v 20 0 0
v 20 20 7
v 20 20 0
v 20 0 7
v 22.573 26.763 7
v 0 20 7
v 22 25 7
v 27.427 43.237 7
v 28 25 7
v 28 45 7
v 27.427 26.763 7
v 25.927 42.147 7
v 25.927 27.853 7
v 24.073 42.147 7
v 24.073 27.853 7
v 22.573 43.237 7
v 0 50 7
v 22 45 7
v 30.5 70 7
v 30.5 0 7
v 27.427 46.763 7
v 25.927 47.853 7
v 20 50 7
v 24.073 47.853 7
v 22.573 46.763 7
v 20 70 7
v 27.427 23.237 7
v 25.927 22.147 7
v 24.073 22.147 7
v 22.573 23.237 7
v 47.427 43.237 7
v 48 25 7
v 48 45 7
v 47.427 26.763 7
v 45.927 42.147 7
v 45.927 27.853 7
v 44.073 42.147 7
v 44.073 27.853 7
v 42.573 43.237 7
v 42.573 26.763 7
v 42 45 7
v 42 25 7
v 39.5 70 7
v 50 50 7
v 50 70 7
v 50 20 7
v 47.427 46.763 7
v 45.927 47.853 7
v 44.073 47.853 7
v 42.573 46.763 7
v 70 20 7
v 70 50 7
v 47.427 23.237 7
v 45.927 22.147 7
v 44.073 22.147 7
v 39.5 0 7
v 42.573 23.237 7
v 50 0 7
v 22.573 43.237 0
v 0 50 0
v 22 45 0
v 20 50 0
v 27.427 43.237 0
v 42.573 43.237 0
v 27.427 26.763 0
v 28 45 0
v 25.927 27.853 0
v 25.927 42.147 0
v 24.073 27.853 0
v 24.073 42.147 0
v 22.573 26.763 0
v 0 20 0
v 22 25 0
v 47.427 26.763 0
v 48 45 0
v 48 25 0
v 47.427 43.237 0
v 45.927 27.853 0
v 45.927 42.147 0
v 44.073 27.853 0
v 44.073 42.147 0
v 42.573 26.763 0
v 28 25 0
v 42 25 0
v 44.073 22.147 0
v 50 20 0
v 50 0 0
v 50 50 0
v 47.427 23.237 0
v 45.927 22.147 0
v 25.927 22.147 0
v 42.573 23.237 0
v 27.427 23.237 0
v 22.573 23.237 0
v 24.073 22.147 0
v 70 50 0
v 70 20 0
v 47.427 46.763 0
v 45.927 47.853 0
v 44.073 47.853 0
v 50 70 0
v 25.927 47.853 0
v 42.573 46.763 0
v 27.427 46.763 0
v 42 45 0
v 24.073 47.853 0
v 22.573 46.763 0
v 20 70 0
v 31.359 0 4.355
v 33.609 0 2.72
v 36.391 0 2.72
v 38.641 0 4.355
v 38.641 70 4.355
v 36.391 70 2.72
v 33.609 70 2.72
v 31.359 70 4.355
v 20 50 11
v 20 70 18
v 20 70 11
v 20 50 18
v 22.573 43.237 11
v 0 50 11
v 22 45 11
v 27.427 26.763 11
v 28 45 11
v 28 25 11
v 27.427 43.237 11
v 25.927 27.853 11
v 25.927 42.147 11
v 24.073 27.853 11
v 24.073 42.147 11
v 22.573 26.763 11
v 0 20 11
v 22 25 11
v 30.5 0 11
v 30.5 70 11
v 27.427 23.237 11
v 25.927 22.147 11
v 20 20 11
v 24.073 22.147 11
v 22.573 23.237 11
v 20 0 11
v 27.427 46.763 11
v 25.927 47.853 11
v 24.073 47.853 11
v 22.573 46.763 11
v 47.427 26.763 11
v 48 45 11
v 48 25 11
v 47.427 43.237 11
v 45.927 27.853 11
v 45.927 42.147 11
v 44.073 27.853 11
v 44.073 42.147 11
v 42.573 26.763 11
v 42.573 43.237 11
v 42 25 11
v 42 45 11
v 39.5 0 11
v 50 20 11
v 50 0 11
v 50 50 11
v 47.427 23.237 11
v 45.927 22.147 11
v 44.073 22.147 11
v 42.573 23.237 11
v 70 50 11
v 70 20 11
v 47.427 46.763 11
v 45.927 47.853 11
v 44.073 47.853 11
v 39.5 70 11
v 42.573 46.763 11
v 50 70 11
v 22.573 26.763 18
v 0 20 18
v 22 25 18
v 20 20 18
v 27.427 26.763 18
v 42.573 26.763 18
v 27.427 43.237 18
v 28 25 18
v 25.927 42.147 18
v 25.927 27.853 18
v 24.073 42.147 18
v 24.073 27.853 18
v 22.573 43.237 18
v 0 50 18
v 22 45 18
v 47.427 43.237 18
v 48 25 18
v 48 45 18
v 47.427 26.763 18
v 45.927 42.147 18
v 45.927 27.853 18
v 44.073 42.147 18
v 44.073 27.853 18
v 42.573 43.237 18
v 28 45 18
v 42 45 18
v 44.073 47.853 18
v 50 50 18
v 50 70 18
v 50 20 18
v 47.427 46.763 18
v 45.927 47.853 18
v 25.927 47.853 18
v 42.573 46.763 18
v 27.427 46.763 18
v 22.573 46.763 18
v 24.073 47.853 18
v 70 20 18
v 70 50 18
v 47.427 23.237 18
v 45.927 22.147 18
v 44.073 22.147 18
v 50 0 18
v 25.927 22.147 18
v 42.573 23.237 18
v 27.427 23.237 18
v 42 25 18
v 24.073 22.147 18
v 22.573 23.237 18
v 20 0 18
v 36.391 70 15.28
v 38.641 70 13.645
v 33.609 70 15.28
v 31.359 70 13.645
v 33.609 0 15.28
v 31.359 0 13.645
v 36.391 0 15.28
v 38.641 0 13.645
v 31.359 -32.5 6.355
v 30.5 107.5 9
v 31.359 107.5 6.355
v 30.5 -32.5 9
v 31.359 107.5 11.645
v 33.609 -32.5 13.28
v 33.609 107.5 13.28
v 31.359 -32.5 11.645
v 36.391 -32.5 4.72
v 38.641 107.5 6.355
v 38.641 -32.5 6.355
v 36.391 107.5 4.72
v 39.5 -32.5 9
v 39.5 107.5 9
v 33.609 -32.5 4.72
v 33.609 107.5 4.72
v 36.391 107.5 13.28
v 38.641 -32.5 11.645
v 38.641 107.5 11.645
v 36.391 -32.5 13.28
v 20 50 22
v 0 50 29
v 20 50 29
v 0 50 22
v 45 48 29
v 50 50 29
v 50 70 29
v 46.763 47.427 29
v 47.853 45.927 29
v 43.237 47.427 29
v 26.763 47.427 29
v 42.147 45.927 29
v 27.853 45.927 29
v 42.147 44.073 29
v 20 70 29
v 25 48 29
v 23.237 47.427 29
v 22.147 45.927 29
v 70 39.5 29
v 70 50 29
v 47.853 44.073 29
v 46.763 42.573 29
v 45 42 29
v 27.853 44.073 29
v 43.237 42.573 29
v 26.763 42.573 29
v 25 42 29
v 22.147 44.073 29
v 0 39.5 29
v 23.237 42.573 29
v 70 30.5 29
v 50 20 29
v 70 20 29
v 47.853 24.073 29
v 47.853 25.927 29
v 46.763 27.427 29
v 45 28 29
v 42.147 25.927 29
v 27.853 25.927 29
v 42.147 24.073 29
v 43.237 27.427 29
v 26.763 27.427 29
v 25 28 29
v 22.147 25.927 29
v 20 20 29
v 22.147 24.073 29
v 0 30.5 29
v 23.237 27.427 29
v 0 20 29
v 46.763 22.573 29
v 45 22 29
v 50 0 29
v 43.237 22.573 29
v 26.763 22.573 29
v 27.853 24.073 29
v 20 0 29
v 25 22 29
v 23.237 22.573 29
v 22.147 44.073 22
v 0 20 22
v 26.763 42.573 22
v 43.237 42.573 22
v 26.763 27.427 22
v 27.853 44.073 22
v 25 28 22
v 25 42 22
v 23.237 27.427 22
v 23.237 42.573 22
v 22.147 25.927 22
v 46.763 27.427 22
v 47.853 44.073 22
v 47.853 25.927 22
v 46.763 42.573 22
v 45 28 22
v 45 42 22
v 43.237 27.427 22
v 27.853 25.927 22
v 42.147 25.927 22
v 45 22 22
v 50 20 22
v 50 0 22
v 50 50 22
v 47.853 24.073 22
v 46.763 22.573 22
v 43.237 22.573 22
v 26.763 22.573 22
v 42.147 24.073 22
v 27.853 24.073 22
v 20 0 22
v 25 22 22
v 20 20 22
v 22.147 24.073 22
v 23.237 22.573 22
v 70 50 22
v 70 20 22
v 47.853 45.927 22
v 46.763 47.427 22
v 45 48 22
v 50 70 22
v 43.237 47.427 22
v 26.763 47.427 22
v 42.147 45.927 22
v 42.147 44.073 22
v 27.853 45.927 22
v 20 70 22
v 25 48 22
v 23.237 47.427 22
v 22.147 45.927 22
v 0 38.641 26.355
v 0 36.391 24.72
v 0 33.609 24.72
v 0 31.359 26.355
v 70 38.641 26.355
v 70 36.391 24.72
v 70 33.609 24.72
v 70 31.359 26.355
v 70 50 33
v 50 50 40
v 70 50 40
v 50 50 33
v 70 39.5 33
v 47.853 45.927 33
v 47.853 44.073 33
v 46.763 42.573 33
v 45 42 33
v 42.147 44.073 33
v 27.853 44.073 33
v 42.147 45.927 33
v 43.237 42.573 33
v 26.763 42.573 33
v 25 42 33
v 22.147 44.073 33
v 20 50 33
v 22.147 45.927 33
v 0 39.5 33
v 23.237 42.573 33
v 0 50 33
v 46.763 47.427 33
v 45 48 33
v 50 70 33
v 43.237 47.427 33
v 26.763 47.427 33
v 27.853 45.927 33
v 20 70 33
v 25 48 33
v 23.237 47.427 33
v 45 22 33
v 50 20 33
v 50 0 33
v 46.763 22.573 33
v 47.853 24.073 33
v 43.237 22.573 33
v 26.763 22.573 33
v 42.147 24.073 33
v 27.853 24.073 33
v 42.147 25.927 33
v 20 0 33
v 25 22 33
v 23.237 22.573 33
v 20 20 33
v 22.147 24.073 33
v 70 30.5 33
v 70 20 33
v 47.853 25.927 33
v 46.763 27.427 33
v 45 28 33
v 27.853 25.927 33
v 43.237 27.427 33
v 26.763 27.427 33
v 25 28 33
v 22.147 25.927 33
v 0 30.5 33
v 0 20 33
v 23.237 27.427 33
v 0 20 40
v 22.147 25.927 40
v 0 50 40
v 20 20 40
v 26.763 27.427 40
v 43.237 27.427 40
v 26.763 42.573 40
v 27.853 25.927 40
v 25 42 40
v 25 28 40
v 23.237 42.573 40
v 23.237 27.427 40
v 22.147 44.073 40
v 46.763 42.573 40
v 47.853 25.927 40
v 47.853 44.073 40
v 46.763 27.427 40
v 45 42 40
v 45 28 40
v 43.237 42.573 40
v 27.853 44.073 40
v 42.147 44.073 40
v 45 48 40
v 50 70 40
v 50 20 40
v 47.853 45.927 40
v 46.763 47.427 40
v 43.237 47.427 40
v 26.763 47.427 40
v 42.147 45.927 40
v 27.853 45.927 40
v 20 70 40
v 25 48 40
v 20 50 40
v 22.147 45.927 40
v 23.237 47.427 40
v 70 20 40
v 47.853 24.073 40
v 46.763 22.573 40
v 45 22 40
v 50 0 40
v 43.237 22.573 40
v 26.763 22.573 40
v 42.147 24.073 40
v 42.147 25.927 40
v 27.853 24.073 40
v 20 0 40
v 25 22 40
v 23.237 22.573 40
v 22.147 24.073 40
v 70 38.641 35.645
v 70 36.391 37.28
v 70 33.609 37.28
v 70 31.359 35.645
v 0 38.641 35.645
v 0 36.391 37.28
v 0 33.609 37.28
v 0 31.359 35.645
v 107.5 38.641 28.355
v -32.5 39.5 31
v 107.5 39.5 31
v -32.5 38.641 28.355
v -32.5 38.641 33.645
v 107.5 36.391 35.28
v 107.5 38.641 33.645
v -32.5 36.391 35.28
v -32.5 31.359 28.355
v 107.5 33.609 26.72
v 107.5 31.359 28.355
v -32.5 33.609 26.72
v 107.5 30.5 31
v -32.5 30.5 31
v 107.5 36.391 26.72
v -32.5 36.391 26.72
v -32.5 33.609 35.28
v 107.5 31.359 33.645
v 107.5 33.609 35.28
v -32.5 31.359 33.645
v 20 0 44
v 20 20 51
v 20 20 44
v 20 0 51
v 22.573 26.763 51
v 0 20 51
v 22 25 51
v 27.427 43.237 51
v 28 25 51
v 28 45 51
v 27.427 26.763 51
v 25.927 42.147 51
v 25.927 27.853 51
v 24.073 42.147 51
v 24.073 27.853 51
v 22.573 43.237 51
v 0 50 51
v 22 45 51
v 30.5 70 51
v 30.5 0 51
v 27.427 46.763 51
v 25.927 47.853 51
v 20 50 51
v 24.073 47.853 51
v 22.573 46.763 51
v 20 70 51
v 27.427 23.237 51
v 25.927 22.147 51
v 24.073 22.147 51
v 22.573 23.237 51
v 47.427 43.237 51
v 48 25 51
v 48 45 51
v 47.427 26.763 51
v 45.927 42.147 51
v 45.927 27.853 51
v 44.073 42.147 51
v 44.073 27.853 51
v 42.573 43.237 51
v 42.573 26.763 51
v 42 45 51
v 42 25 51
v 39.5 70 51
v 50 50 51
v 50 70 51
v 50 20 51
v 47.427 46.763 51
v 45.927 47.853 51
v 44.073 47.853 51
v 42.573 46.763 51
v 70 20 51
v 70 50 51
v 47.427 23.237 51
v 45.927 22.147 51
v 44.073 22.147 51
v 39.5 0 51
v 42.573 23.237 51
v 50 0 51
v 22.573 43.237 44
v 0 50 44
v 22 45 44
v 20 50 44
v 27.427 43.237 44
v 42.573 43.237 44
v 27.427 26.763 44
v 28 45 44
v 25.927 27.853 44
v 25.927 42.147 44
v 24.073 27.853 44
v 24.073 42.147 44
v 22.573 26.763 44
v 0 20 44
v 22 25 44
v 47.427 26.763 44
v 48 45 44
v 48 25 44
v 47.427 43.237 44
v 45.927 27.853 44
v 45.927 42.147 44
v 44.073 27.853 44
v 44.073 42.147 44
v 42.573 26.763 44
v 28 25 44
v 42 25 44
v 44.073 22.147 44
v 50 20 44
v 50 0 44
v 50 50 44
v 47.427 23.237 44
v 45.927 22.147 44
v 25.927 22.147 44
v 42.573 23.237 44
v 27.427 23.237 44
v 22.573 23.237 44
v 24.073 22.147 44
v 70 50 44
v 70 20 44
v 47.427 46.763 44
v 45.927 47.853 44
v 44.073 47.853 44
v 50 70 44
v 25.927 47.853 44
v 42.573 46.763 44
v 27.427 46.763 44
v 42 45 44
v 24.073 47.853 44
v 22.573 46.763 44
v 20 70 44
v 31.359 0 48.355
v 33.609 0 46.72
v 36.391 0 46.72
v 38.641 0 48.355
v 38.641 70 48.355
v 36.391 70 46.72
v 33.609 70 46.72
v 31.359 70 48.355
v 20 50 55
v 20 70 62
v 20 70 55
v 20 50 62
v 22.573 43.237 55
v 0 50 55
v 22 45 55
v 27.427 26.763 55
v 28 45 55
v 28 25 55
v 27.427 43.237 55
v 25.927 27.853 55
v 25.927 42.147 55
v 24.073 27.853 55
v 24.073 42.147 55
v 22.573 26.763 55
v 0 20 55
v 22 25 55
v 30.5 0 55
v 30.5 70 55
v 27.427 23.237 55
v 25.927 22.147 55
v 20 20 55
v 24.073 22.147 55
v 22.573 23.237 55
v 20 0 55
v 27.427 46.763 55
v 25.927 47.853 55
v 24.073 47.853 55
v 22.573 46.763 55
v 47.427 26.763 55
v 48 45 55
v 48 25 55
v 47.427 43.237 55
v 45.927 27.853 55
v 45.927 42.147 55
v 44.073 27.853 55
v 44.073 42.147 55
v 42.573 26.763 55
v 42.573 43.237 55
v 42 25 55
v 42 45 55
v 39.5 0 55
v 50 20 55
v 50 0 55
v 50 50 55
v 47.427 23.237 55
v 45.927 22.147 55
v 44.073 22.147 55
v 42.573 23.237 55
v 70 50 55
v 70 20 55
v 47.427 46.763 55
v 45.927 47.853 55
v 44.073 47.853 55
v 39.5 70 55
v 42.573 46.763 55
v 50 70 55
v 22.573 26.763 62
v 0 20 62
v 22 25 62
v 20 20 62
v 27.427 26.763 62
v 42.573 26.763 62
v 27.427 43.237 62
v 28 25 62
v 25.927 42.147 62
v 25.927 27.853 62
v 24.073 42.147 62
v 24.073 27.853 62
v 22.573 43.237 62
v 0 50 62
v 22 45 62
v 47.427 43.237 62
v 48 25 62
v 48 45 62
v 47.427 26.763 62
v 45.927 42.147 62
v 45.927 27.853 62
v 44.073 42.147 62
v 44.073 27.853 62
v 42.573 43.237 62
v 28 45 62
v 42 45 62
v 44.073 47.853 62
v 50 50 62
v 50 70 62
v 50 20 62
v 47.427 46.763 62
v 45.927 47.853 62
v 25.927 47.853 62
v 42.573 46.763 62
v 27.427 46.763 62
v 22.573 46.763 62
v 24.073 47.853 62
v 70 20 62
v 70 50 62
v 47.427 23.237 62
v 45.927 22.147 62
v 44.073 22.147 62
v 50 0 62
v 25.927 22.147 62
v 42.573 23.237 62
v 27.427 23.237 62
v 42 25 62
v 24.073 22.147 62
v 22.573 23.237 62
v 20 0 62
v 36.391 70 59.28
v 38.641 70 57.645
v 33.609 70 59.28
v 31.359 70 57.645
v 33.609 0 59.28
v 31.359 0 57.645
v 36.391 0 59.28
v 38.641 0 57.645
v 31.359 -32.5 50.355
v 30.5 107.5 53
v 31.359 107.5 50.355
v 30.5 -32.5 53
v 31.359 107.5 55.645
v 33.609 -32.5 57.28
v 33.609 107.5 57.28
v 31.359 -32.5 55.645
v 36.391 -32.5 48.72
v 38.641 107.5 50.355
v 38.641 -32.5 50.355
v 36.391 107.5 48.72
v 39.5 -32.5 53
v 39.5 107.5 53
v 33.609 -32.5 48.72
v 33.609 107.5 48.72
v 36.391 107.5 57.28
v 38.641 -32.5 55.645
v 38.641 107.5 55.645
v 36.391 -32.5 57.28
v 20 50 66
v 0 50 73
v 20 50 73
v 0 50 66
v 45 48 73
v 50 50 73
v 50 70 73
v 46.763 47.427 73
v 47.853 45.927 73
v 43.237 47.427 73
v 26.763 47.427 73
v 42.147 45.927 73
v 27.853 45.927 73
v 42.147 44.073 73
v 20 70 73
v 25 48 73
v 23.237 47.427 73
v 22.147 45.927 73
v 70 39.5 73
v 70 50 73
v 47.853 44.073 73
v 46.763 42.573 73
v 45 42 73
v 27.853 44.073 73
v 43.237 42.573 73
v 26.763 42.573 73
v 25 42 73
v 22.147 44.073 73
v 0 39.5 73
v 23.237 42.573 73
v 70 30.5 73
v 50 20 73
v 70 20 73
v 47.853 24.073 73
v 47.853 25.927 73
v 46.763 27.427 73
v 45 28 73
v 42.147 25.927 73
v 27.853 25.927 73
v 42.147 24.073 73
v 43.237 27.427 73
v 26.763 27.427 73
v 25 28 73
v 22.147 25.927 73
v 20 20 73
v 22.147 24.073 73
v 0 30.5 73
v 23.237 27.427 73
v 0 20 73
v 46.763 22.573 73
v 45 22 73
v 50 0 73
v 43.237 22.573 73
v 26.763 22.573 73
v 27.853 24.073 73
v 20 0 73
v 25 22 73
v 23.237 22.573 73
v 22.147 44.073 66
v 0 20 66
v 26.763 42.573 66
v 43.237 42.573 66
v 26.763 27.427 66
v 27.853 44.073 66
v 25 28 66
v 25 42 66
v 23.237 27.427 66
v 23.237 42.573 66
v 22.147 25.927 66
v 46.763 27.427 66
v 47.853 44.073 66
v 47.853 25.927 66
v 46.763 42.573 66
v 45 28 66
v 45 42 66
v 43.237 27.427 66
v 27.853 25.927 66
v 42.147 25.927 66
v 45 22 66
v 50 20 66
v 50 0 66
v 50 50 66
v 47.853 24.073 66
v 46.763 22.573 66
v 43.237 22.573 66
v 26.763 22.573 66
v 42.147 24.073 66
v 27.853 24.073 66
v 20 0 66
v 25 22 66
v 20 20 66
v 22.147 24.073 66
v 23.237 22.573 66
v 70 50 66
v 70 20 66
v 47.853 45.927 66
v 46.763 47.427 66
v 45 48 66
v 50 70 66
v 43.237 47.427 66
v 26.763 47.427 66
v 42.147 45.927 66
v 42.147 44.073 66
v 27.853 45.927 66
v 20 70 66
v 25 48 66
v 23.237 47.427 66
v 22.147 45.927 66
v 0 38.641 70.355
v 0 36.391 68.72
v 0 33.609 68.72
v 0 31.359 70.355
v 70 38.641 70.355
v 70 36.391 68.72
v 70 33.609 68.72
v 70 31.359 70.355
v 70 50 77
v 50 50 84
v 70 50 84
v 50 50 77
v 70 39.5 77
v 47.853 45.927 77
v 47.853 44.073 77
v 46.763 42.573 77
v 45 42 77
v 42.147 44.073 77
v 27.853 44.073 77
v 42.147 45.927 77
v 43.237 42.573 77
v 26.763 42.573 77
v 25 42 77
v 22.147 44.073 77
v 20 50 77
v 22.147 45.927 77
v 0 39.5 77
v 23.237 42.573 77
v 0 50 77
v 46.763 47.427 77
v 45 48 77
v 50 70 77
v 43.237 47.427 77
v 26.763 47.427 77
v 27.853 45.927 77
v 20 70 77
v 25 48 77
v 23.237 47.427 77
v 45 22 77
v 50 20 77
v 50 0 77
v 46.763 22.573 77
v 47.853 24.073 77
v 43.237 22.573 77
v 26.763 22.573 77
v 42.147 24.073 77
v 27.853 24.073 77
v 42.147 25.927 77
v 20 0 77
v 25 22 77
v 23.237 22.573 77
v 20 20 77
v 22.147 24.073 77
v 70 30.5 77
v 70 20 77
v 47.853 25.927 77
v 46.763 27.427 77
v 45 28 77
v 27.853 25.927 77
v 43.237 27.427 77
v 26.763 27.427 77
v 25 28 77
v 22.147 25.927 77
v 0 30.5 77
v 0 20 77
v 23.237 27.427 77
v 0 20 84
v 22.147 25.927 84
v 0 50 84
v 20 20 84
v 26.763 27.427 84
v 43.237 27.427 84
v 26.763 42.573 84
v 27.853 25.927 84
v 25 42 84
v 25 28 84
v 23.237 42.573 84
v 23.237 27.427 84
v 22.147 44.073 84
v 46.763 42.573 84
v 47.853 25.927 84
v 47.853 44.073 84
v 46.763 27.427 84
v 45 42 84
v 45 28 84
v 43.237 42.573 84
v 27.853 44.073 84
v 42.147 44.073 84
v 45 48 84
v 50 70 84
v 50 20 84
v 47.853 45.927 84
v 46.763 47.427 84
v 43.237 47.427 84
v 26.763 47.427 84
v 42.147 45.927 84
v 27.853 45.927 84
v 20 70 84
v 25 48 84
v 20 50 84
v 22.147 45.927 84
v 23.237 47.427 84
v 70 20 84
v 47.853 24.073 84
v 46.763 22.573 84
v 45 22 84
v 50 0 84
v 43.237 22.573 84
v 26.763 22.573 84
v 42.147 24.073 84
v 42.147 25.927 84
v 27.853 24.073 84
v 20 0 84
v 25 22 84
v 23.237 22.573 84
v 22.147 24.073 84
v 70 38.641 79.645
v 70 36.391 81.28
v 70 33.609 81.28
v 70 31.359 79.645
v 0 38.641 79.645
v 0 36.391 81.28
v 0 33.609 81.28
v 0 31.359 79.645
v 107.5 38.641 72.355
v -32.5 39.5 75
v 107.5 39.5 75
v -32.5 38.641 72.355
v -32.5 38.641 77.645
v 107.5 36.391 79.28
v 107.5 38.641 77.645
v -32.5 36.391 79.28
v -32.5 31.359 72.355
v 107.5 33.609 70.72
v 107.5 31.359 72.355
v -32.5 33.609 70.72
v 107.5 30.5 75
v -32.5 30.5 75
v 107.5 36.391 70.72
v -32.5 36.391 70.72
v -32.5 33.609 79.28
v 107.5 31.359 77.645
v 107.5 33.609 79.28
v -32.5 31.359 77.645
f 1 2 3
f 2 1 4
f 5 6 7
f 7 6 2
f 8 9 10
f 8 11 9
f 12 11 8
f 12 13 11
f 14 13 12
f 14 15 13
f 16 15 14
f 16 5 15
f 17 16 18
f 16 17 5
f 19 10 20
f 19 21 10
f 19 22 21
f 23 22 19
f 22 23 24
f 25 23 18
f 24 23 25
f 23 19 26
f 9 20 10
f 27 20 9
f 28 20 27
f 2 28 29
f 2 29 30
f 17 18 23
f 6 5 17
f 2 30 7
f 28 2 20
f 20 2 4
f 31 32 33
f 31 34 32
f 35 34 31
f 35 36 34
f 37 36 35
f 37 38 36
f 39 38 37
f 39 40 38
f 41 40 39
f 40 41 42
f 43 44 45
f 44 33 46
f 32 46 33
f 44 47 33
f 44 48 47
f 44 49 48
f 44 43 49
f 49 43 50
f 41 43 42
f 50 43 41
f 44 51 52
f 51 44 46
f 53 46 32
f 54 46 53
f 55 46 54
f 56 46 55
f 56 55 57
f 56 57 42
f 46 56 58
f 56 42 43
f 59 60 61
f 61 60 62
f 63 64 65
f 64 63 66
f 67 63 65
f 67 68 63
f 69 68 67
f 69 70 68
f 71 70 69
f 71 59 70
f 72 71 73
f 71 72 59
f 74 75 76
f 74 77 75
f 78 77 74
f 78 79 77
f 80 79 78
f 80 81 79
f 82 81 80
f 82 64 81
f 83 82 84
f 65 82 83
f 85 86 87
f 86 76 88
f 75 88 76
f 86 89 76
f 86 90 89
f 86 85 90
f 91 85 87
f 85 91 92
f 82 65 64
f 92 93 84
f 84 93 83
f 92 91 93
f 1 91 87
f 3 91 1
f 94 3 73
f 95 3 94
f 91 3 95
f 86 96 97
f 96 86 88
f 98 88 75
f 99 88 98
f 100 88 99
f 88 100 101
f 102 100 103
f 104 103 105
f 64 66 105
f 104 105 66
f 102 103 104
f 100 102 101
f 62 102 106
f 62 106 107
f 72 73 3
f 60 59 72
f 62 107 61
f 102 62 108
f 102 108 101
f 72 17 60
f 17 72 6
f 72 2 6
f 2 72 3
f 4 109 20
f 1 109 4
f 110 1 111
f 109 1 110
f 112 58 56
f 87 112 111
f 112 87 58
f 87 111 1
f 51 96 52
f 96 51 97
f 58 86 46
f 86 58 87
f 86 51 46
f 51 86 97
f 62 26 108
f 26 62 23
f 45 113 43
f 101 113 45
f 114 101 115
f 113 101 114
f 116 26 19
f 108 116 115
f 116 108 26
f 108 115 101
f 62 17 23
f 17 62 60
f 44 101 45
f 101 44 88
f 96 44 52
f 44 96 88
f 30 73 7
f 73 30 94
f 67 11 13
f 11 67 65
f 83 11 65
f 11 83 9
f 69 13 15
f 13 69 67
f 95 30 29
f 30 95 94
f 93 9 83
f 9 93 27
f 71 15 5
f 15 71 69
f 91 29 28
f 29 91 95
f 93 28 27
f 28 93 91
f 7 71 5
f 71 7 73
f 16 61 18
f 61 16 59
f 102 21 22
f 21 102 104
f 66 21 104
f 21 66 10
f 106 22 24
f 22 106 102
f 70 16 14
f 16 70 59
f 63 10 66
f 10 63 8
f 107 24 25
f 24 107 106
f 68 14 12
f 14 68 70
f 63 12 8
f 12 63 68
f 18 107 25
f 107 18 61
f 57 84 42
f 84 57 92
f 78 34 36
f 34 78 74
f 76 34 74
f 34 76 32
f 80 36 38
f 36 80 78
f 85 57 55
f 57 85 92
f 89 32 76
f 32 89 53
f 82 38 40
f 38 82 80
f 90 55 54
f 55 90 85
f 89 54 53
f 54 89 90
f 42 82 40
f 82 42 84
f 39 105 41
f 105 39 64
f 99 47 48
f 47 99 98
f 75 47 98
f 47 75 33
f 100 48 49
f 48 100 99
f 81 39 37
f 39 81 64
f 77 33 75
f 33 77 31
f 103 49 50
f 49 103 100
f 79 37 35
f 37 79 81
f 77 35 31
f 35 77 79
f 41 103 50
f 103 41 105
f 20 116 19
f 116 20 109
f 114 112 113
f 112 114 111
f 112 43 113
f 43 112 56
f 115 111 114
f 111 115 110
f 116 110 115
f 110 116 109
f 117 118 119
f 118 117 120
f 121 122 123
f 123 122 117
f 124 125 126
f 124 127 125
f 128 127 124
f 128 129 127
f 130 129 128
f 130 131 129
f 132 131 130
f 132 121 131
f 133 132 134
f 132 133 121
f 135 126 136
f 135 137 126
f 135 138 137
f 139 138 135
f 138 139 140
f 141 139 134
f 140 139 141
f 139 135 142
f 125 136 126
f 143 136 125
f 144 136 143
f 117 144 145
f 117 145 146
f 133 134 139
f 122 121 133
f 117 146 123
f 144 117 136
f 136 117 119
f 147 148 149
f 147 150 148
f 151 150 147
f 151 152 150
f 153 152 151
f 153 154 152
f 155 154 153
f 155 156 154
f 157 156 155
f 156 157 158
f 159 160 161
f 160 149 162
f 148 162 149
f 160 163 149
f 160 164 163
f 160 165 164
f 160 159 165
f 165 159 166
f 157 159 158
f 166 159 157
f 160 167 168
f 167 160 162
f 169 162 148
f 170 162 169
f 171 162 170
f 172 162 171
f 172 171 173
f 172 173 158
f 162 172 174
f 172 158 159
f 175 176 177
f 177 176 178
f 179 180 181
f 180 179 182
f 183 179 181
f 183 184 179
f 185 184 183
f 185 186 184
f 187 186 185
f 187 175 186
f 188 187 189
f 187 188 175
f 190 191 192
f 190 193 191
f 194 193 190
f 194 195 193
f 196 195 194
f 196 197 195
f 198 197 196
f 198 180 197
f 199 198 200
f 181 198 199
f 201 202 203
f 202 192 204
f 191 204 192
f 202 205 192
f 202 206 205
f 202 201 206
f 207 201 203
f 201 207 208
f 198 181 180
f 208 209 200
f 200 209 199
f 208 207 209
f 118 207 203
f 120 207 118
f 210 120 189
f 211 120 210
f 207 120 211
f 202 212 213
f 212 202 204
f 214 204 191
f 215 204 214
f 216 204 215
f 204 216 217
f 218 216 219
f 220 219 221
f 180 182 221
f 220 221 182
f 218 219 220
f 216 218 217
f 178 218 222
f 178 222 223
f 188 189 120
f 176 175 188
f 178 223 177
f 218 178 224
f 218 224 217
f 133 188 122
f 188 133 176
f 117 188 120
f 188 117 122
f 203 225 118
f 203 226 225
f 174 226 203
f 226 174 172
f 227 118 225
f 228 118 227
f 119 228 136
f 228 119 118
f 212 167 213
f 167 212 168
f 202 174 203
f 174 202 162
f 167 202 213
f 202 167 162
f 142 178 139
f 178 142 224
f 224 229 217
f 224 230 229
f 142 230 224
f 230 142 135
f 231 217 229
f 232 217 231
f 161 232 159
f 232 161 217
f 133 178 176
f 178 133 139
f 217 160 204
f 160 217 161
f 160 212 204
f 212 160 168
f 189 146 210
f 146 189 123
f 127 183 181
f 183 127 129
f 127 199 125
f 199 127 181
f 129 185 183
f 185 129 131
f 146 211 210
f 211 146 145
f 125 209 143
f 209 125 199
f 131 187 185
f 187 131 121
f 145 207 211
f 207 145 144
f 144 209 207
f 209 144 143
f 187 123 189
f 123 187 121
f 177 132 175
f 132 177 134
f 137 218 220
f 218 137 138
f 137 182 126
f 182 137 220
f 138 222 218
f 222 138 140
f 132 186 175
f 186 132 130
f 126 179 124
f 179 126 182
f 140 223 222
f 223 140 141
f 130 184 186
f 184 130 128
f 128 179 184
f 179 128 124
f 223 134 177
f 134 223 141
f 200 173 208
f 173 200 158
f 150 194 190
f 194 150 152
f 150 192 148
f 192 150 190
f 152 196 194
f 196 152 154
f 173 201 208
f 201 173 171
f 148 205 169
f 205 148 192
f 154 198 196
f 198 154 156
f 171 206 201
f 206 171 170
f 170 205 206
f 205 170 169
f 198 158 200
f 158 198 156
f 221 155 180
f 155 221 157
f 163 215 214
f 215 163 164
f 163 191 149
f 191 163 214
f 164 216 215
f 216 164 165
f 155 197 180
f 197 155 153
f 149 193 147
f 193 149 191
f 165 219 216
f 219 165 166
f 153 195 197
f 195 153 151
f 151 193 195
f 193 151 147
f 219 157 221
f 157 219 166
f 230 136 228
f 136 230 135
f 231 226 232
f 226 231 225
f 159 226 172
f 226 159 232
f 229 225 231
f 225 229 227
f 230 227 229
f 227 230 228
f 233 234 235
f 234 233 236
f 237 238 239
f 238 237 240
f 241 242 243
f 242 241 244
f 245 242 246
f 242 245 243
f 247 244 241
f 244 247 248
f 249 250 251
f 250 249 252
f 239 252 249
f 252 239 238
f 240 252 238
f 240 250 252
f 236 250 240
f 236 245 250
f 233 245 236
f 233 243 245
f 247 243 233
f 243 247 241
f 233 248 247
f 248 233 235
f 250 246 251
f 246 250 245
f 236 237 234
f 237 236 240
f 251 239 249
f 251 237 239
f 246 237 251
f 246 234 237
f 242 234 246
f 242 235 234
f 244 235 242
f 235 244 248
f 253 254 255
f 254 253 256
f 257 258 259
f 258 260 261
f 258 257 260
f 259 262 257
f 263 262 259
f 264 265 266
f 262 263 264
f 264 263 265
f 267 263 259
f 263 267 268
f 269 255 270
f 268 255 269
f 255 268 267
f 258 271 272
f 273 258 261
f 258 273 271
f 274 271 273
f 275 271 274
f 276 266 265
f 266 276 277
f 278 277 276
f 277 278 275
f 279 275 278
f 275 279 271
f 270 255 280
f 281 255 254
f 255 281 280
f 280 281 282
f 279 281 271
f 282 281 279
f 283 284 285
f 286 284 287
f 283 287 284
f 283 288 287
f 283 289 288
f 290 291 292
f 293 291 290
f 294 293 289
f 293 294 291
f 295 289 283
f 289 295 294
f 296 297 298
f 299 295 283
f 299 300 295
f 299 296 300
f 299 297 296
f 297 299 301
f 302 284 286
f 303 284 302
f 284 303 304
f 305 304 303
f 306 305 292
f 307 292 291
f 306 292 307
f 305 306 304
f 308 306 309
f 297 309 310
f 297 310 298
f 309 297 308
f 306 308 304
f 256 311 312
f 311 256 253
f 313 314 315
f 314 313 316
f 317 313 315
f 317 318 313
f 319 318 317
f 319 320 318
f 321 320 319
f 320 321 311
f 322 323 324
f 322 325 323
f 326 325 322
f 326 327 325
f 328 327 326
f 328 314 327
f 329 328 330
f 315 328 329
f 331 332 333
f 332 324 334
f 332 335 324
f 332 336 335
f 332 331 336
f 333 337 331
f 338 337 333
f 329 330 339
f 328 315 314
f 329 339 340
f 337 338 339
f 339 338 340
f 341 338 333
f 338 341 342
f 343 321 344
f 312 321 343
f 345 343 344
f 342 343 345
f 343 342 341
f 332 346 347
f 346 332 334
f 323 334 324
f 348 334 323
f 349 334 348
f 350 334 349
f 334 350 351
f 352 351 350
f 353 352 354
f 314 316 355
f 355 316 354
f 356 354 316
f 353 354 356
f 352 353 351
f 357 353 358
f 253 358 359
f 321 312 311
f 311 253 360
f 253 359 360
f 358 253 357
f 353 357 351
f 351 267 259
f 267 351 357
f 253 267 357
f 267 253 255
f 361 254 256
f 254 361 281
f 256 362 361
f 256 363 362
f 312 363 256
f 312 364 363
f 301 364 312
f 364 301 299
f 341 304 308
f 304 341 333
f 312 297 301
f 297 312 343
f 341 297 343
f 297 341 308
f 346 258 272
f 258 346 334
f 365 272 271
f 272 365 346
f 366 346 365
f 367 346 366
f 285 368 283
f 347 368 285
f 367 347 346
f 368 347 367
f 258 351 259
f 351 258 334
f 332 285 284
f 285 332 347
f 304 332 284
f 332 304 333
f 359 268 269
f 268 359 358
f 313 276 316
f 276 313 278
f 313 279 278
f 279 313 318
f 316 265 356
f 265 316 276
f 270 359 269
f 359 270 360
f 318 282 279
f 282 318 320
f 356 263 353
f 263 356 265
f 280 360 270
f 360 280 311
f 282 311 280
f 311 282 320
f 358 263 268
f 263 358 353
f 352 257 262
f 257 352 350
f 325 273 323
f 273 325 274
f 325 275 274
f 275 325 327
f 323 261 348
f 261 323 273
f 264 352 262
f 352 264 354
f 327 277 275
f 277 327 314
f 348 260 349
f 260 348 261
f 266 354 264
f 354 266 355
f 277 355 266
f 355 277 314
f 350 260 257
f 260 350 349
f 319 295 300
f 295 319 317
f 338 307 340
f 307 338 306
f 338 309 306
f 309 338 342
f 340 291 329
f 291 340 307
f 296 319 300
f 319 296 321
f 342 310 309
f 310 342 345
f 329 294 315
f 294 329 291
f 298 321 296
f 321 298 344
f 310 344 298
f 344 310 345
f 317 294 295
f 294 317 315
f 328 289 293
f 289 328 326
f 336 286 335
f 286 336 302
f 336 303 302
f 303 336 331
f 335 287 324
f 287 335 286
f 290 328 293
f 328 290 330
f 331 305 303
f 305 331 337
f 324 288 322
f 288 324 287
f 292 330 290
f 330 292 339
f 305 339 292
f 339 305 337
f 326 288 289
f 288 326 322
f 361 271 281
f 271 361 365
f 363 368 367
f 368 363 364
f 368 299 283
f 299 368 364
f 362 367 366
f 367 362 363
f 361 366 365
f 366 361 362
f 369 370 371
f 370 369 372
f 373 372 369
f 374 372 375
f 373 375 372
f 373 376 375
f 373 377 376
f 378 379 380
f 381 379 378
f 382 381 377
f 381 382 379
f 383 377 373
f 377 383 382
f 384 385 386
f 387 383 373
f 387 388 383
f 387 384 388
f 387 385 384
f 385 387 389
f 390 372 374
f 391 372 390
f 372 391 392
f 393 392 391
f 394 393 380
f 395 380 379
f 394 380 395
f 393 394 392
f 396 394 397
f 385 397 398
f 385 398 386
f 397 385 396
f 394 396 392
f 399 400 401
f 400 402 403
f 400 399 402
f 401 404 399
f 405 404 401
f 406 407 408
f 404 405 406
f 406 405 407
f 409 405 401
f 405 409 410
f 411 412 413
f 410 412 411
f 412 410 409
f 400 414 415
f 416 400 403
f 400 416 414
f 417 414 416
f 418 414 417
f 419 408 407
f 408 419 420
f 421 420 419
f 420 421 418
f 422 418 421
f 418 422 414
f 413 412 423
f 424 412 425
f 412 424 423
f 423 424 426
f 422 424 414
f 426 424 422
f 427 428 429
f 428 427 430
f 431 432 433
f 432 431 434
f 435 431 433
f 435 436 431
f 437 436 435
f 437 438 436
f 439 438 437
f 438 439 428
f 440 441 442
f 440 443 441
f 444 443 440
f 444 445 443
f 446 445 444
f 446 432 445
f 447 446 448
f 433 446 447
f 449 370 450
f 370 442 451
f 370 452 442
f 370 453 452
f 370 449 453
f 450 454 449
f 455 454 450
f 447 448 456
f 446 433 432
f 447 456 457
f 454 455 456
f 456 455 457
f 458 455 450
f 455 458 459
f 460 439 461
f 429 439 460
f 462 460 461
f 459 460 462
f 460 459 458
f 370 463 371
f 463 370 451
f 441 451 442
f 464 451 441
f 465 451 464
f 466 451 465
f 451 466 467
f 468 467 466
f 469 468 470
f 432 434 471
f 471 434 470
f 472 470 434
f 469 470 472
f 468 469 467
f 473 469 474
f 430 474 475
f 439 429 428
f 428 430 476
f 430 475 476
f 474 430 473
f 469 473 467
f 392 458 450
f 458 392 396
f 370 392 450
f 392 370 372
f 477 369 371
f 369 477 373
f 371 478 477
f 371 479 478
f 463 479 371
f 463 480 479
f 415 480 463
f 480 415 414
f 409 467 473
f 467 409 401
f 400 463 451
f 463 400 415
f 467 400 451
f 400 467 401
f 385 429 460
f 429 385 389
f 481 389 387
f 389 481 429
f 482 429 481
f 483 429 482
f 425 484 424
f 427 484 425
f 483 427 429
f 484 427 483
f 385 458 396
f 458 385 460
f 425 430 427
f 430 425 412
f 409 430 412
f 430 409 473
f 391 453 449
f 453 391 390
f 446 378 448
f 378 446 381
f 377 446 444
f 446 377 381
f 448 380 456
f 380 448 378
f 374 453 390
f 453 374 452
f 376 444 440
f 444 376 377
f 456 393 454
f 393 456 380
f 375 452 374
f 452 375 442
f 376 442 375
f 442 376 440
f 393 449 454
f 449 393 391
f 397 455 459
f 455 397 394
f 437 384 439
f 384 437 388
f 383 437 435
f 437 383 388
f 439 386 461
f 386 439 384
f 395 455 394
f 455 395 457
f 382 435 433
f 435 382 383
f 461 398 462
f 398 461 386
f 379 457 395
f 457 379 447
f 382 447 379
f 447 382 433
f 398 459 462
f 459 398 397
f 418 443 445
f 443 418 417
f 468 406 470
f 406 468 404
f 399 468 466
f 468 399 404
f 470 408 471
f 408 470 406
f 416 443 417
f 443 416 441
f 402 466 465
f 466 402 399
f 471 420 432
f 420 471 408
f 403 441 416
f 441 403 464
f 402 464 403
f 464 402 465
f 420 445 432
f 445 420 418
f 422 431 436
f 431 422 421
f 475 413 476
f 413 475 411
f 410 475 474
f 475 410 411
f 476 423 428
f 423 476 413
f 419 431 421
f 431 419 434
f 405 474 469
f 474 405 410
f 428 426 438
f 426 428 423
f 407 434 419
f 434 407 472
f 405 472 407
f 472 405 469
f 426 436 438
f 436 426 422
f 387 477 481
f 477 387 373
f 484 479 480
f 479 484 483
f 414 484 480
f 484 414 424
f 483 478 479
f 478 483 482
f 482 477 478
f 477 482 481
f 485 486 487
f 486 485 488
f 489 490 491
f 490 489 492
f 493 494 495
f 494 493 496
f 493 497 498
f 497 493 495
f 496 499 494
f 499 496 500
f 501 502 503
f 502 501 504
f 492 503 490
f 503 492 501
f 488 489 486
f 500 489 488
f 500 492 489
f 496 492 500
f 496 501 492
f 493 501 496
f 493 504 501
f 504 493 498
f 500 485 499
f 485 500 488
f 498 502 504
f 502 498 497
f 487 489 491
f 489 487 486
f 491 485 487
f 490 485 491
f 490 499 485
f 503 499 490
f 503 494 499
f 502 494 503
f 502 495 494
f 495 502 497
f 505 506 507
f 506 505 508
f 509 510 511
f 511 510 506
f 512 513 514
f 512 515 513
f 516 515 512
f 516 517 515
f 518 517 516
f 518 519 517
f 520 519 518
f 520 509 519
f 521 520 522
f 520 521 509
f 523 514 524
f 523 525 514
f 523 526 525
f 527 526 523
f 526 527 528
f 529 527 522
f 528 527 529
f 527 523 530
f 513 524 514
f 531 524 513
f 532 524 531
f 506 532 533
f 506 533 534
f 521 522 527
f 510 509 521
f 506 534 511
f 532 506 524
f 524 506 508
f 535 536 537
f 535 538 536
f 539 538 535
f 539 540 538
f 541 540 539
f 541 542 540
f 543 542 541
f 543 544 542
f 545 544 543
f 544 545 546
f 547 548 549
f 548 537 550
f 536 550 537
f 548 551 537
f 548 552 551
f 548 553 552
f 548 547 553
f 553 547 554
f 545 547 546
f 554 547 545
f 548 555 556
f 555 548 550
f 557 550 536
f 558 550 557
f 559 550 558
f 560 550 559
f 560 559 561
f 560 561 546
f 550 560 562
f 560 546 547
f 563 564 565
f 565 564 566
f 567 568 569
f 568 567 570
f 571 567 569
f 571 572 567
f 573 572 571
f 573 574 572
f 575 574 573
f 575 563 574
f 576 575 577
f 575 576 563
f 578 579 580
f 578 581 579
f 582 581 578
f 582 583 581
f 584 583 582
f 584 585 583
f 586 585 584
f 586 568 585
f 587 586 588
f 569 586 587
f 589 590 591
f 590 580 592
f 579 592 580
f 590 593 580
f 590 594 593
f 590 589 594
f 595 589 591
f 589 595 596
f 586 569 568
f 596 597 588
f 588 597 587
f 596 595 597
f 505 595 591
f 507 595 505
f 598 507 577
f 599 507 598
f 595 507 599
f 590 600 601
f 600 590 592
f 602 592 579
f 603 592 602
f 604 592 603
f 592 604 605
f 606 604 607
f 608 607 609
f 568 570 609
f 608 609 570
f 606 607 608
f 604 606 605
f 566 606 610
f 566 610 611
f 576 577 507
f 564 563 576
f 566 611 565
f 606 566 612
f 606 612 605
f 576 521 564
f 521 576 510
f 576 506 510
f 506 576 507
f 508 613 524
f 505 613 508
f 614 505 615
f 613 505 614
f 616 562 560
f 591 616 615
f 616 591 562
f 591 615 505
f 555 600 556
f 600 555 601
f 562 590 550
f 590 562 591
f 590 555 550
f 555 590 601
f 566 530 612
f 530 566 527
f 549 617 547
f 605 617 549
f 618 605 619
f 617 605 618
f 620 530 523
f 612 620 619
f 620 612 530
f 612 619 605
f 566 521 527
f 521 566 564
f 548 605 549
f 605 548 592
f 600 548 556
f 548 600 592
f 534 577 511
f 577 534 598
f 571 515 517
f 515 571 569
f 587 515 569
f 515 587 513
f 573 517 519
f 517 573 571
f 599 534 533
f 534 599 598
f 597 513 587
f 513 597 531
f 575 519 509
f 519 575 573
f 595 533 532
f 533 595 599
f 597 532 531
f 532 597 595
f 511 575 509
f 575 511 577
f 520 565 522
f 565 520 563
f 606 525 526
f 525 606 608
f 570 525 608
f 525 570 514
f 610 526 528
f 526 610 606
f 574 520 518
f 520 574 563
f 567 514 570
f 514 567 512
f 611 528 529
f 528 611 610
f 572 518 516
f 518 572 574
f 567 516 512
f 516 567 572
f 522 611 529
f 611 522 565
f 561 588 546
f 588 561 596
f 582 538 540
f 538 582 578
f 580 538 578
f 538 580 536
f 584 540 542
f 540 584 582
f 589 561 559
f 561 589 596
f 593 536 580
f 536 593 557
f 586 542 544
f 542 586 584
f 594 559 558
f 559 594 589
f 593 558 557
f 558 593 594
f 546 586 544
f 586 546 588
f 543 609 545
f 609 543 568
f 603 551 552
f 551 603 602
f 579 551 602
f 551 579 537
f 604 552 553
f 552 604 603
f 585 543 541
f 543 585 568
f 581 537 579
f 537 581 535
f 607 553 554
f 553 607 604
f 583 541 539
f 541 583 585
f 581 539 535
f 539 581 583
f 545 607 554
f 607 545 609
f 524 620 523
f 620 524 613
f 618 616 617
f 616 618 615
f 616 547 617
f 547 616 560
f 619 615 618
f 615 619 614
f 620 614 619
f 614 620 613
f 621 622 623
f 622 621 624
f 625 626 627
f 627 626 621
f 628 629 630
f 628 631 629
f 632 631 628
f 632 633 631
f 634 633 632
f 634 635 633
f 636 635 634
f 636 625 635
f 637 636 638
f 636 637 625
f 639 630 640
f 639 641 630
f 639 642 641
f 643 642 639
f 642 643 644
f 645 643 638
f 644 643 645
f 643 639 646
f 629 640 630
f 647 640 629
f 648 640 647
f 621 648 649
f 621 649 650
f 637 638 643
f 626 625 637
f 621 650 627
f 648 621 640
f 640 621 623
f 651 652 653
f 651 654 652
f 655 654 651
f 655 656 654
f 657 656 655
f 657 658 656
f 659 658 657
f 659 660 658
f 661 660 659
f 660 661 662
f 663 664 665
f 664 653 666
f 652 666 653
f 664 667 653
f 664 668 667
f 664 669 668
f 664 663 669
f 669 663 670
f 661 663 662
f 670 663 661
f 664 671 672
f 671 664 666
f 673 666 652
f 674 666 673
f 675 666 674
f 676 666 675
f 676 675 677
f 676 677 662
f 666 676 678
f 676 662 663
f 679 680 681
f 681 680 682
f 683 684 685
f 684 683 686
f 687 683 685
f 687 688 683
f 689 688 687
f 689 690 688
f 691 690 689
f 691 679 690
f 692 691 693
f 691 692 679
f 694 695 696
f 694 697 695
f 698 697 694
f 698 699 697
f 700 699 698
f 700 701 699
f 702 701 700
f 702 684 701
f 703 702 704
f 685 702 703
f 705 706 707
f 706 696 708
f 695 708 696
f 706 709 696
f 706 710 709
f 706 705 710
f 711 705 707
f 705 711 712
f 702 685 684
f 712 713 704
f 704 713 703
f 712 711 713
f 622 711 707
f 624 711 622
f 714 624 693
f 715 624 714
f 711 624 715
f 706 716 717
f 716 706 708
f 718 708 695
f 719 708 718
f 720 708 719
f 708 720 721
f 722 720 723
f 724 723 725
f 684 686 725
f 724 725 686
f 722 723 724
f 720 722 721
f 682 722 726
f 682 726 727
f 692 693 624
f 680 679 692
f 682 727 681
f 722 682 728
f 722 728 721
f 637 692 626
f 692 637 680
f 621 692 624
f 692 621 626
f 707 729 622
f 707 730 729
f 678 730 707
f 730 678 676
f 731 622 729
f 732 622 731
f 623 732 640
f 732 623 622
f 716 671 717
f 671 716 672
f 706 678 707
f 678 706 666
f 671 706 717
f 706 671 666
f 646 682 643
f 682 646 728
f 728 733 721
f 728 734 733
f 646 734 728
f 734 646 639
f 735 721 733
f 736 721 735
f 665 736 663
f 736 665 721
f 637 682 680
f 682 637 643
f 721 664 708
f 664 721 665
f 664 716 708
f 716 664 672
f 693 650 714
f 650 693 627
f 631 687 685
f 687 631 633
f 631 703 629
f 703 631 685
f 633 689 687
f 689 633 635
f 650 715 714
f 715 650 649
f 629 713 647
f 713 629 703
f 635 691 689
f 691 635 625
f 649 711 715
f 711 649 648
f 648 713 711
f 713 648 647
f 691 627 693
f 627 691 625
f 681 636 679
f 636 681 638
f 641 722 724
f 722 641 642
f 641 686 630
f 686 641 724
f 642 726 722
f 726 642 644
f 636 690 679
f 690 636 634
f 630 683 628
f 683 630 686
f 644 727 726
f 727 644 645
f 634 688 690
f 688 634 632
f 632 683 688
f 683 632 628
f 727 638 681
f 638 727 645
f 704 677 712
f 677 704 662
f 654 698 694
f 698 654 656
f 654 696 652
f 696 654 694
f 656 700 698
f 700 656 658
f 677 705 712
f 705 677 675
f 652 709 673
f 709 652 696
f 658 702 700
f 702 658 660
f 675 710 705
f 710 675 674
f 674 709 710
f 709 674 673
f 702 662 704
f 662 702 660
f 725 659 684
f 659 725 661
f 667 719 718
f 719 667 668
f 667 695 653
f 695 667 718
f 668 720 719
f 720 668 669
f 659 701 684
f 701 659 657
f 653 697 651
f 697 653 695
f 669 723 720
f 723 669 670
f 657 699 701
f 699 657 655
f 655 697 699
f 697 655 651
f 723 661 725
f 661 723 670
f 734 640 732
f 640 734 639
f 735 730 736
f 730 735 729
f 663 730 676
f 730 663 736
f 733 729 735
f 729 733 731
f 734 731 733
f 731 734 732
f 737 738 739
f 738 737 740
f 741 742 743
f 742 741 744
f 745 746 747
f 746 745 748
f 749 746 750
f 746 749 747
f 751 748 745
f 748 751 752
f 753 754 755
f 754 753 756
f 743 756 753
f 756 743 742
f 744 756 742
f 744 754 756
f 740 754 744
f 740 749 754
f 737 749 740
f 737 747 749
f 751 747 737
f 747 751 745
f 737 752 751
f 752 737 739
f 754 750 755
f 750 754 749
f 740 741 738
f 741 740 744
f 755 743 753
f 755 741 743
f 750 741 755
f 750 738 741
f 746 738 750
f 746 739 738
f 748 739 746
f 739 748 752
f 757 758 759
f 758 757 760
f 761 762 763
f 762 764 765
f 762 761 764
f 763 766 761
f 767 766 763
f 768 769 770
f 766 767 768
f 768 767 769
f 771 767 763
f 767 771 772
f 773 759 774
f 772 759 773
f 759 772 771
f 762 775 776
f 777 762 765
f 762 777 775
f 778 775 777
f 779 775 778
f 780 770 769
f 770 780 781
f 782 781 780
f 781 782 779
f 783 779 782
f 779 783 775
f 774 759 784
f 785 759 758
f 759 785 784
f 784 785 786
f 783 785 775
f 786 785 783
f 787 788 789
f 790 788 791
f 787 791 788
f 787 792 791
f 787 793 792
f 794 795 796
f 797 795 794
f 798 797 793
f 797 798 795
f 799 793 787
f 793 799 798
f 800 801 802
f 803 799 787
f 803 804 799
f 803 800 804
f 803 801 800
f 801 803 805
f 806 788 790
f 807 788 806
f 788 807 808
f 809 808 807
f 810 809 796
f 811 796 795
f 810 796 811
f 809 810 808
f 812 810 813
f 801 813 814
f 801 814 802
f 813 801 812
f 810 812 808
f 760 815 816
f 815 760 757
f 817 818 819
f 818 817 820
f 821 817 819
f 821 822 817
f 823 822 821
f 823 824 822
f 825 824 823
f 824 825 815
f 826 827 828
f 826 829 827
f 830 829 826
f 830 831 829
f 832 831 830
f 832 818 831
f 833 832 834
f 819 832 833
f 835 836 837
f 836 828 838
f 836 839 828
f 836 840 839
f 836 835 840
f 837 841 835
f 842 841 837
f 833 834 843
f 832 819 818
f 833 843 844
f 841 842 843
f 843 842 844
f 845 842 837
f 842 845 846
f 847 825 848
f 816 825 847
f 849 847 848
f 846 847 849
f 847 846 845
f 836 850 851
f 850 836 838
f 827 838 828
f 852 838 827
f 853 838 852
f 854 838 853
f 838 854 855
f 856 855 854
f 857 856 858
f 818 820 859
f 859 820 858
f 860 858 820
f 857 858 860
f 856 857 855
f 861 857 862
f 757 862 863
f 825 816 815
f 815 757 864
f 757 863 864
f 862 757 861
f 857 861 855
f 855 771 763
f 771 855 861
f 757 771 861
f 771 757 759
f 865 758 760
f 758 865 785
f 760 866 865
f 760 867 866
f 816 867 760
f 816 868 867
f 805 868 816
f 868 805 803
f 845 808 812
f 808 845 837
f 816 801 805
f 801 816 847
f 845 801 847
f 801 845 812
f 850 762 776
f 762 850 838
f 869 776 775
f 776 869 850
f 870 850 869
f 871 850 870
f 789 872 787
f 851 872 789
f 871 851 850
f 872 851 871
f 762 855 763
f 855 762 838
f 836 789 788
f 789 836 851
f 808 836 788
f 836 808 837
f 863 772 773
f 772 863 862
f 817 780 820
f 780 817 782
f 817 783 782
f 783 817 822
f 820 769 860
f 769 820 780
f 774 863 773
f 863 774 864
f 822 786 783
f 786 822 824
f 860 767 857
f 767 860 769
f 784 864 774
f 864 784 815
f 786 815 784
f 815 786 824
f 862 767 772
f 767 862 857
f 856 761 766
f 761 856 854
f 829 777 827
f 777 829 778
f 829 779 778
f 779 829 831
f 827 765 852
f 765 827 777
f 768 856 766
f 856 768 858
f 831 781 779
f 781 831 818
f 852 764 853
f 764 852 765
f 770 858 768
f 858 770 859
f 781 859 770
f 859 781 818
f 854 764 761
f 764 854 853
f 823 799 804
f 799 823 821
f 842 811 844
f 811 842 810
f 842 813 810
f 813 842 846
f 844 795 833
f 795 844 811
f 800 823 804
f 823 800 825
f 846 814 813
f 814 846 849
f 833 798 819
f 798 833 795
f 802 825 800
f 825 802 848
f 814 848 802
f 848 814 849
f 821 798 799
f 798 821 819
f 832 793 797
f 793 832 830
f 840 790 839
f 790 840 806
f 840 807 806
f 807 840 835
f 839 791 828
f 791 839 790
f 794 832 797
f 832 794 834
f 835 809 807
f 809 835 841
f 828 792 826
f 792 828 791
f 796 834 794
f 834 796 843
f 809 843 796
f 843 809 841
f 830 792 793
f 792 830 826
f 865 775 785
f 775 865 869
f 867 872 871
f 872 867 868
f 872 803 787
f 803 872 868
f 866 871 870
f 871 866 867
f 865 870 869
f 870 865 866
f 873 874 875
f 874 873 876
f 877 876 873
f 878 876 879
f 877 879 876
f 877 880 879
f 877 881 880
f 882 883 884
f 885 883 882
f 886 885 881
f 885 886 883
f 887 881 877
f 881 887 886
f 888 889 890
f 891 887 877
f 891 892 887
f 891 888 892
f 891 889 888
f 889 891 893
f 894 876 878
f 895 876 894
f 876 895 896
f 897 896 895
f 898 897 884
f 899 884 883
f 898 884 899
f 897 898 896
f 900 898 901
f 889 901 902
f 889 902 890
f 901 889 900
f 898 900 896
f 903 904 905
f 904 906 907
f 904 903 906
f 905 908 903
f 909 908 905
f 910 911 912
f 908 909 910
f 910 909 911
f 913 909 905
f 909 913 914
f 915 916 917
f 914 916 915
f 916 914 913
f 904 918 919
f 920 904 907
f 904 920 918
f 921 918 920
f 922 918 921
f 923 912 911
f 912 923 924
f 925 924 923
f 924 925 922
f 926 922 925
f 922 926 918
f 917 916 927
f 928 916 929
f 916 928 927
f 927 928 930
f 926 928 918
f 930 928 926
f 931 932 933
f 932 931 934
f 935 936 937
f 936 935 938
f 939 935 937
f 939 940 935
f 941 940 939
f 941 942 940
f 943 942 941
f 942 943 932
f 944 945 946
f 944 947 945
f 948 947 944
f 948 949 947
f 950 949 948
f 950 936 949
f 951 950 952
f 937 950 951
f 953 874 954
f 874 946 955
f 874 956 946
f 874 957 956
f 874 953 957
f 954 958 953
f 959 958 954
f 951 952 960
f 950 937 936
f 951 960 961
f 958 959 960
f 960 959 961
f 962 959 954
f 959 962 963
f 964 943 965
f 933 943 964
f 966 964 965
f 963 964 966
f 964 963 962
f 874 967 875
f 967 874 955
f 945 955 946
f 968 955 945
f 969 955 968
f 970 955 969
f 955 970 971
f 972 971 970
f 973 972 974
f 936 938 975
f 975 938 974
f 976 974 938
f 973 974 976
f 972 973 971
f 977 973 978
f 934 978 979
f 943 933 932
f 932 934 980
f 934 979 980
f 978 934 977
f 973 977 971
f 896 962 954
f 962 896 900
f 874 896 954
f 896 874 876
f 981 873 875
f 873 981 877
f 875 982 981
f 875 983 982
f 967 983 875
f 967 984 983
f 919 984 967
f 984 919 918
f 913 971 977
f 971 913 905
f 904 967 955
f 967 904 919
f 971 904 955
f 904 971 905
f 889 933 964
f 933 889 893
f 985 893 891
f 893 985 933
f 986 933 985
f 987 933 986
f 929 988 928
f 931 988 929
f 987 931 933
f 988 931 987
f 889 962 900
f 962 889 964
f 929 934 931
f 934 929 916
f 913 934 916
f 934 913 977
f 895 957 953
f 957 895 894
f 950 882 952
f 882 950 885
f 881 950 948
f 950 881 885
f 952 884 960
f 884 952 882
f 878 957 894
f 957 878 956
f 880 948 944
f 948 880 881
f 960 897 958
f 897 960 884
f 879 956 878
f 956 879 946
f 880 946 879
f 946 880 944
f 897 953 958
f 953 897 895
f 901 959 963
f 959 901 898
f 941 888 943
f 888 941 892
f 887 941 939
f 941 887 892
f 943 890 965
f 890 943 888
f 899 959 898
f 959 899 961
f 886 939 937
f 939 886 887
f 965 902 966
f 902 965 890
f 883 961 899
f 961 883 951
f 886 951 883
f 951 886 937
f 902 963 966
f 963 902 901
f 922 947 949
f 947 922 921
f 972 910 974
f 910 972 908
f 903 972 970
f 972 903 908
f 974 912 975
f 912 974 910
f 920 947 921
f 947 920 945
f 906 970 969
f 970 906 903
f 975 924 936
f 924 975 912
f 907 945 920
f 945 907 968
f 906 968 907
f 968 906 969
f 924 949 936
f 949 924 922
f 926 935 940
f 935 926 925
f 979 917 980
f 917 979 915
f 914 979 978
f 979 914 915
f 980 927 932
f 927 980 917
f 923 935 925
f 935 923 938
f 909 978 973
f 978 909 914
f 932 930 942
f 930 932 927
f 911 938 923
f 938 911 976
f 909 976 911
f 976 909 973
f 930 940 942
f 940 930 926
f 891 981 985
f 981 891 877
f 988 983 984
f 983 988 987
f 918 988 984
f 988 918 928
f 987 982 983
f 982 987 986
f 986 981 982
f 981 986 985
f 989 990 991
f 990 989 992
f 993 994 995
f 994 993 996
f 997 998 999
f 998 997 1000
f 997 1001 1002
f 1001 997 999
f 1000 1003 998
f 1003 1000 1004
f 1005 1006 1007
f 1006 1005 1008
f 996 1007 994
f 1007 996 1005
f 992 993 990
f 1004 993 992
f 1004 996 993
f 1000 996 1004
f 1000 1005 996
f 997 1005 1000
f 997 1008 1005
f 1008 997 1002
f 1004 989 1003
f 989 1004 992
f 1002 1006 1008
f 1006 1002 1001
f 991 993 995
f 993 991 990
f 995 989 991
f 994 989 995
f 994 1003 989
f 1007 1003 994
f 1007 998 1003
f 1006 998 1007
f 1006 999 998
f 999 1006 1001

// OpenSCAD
// file: hardware.scad
axle_r = 4.5;
axle_separation = 30;

module axle(h) {
	rotate(v=[-1,0,0], a=90) cylinder(r=axle_r, h=h, $fn=10);
}

module axlepair(h=100) {
	union() {
		axle(h);
		translate(v=[axle_separation, 0, 0]) axle(h);
	}
}

module m2(h=16) {
	union() {
		cylinder(r=2, h=2);
		cylinder(r=1.5, h=h);
	}
}

module m3(h=16) {
	union() {
		cylinder(r=3.25, h=3);
		cylinder(r=2, h=h);
	}
}

module m5(h=16) {
	union() {
		cylinder(r=4.5, h=5);
		cylinder(r=3, h=h);
	}
}
// file: brock_b.scad
include <hardware.scad>

brock_b_height = 7;

module brock_b() {
	h = brock_b_height;

	corner = 20;
	width = 70;
	screw = 5;
	z_off = 6.1;
	m5_z_off = -6;

	difference() {
		cube([width, width, h]);

		for (v = [[0,0,0],[width-corner,0,0],
				[0,width-corner,0],[width-corner,width-corner,0]]) 
			translate(v=v) cube([corner, corner, h]);

		for (x=[corner+screw, width-(corner+screw)])
			for (y=[corner+screw, width-(corner+screw)])
				translate(v=[x,y,m5_z_off]) m5();

		translate(v=[width/2,-0.5,h]) axle(h=width+1);
	}
}

brock_b();
// main file
use <brock_b.scad>
use <hardware.scad>

module brock_pair() {
    brock_w = 70;
    brock_h = 7;
    brock_sp = 4;
    axle_len = 200;
    union() {
	brock_b();
	translate([0,brock_w,brock_h * 2 + brock_sp]) {
	    rotate(v=[1,0,0], 180) brock_b();
	}
	translate([brock_w / 2,
		(-axle_len+brock_w)/4,
		brock_h + brock_sp / 2]) axle(140);
    }
}

brock_pair();

union(){
    translate([0,70,22]) rotate(-90) brock_pair();
    translate([0,0,44]) brock_pair();
    translate([0,70,66]) rotate(-90) brock_pair();
}
